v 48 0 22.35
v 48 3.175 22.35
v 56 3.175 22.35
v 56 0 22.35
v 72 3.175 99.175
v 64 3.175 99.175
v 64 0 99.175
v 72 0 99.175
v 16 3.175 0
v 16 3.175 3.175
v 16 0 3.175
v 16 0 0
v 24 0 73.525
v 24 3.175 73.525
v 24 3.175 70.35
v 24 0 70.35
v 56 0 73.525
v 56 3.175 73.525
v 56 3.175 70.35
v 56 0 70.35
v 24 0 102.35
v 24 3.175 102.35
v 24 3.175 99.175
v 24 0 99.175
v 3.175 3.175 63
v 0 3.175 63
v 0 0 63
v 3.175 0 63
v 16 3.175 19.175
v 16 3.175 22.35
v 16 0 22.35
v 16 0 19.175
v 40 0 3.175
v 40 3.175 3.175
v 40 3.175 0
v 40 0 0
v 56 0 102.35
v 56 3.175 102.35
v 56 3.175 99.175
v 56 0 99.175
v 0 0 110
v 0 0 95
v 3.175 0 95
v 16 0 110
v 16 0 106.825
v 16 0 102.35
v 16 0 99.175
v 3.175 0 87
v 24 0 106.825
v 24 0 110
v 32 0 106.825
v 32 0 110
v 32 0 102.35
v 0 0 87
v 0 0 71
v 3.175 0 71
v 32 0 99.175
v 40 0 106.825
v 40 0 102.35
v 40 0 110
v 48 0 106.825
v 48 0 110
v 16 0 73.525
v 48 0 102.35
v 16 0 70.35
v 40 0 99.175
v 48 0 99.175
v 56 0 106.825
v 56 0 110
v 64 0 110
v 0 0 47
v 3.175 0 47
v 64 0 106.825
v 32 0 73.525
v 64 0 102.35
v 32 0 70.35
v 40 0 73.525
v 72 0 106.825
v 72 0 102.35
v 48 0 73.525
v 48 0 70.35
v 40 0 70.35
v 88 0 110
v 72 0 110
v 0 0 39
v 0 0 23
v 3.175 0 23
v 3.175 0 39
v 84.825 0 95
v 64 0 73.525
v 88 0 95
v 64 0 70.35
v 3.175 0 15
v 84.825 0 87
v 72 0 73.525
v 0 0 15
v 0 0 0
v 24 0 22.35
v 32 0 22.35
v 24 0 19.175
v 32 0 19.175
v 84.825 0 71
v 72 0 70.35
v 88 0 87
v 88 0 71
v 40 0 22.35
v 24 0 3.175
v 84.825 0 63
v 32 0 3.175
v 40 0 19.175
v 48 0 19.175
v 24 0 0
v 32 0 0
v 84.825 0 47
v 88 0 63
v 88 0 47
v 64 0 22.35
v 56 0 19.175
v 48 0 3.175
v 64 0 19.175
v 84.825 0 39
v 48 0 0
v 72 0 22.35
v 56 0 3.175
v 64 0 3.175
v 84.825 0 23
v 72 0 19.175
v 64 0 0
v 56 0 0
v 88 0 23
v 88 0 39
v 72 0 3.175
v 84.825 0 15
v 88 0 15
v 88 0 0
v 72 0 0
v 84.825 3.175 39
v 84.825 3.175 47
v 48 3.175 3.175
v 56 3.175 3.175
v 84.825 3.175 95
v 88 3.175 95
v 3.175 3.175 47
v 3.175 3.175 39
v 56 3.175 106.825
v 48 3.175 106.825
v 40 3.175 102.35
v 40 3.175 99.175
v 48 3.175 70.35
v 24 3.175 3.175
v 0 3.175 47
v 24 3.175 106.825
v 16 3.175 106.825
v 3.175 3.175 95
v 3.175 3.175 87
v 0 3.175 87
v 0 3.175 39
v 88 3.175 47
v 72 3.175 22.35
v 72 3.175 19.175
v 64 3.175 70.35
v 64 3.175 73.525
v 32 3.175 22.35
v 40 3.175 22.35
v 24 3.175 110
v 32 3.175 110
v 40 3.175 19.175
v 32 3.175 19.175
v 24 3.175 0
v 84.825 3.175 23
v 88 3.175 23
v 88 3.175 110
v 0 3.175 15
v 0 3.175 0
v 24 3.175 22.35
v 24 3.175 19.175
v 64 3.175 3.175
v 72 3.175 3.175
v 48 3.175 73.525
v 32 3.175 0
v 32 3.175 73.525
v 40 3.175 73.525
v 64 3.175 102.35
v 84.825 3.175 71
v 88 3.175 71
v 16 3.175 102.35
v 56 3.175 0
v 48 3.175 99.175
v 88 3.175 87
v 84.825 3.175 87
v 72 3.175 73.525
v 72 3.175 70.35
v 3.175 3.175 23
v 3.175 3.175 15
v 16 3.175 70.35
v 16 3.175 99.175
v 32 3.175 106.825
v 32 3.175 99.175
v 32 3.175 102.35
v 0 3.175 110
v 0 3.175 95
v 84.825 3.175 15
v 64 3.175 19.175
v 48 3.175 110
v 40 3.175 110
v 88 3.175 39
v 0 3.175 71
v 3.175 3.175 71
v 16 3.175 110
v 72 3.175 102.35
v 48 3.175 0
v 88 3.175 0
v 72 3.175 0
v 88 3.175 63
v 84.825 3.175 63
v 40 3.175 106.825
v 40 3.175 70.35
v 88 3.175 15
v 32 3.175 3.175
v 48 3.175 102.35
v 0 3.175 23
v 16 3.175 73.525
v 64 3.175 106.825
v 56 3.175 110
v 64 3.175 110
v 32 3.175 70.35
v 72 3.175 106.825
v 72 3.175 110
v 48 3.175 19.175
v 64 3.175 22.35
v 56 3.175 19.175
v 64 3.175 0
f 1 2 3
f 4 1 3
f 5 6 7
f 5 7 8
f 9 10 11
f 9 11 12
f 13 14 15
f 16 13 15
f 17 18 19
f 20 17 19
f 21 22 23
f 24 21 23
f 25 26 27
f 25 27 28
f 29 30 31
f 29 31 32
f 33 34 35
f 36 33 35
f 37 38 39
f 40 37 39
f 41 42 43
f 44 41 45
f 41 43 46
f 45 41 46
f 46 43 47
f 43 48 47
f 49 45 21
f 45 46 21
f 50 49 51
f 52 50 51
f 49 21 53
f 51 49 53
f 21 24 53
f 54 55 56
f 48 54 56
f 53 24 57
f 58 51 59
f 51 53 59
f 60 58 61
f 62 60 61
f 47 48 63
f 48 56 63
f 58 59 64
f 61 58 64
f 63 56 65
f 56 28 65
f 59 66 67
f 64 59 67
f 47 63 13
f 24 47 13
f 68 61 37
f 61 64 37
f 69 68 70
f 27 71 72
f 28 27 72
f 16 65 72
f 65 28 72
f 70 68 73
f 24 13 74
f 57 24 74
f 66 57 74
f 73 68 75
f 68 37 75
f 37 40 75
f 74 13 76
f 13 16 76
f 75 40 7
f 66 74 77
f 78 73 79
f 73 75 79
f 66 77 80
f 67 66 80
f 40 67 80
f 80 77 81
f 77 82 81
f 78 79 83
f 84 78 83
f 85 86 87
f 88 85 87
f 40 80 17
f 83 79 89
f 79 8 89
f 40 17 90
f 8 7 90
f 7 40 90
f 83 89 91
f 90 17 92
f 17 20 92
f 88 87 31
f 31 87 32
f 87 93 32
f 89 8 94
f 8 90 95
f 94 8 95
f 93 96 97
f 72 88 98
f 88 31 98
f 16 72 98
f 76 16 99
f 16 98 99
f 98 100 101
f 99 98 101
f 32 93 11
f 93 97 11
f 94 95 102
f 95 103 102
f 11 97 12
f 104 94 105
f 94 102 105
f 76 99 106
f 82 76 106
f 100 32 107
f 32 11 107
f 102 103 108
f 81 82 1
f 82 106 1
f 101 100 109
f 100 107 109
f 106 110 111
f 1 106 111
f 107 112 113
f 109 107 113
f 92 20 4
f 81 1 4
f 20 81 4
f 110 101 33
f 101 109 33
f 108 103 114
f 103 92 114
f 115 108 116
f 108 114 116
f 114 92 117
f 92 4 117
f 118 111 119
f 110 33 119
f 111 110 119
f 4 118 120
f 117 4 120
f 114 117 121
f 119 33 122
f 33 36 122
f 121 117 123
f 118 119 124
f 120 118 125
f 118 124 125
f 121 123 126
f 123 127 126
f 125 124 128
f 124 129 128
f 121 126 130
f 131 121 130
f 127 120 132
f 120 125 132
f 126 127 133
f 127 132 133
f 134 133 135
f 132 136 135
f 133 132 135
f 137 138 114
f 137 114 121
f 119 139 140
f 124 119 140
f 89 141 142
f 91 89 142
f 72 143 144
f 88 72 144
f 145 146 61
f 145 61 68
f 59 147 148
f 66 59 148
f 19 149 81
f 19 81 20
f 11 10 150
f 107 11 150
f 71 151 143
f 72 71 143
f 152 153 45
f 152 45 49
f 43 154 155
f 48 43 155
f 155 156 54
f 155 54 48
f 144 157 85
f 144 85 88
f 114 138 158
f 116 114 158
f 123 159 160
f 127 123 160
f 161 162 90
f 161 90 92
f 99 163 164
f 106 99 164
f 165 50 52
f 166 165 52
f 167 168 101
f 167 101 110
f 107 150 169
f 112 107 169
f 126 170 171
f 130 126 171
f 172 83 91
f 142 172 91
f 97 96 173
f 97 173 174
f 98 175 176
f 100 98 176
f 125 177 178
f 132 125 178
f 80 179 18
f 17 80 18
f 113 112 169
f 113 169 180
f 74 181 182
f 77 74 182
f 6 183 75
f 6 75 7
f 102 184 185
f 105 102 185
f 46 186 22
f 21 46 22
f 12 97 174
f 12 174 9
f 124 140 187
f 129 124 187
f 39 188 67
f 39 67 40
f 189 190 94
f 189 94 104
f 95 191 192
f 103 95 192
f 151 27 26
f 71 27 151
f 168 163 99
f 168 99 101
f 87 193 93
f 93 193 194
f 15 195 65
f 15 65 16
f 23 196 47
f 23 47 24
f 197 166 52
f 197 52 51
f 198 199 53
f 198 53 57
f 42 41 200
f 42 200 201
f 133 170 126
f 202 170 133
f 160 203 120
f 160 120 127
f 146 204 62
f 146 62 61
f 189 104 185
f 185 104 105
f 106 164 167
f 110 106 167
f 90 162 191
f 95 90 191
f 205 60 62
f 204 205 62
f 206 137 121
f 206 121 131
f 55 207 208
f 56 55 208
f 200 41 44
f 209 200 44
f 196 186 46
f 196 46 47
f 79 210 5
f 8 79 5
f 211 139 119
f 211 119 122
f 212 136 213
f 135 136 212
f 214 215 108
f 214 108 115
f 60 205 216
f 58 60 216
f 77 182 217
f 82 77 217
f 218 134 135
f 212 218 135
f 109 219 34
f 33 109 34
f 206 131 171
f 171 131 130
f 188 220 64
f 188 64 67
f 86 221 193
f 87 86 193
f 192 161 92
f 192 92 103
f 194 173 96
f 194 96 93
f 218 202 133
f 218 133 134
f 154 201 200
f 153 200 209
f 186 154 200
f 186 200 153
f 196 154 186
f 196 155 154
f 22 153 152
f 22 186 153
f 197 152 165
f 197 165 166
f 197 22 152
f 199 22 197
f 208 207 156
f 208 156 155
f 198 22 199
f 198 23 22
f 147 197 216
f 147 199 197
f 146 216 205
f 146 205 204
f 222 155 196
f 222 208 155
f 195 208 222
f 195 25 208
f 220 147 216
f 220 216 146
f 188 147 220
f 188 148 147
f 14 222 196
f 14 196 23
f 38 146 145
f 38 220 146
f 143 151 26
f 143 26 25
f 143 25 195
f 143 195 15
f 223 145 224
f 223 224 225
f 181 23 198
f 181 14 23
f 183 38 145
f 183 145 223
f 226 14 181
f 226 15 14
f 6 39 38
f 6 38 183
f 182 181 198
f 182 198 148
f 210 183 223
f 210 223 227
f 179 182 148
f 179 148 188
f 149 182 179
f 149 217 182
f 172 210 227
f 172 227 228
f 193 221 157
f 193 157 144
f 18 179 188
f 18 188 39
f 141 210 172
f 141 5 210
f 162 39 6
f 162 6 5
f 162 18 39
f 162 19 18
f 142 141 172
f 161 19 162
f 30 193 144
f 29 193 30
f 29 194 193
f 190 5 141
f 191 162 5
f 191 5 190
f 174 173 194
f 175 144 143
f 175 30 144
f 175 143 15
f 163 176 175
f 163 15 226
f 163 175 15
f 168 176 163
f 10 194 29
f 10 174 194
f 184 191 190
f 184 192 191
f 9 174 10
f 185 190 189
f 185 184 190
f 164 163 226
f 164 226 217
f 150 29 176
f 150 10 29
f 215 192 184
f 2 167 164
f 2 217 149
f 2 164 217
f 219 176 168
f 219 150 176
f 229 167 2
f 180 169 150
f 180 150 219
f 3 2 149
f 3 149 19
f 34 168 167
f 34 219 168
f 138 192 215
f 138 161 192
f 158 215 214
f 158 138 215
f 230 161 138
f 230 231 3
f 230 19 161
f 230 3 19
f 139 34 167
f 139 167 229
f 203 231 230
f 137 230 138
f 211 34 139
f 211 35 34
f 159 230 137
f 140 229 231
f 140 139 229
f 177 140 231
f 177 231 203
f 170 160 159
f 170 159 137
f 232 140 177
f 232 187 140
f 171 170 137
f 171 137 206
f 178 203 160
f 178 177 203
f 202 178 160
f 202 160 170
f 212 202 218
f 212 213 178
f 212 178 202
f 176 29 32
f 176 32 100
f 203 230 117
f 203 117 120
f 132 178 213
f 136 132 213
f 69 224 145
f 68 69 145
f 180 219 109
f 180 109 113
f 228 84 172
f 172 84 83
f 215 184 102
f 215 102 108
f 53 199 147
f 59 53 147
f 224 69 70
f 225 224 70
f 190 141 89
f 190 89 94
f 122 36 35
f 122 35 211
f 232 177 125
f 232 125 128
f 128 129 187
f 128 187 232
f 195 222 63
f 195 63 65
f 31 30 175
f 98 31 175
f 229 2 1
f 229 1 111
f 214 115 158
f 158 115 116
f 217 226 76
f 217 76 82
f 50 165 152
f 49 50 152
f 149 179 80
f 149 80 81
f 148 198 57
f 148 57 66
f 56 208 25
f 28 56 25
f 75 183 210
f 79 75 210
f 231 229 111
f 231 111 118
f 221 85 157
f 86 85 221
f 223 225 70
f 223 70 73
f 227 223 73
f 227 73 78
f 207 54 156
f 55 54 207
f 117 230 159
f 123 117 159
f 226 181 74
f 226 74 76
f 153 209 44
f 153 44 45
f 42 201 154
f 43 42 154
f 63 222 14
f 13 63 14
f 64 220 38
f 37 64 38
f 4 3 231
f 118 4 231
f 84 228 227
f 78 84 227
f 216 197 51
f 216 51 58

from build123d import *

# Parameters (mm, degrees)
SKETCH1_W           = 88
SKETCH1_H           = 110
BOSS_EXTRUDE1_DEPTH = 3.175
CUT_EXTRUDE1_REACH  = 5.175
SKETCH2_W           = 8
SKETCH2_H           = 3.175
SKETCH2_W_2         = 3.175
SKETCH2_H_2         = 8
CUT_EXTRUDE2_REACH  = 5.175
SKETCH3_W           = 8
SKETCH3_H           = 3.175
CUT_EXTRUDE3_REACH  = 5.175
SKETCH4_W           = 8
SKETCH4_H           = 3.175


with BuildPart() as part:
    # Sketch1 → Boss-Extrude1 (new body)
    with BuildSketch(Plane(origin=(0, 0, 0), x_dir=(1, 0, 0), z_dir=(0, 1, 0))):
        with Locations((44, -55)):
            Rectangle(SKETCH1_W, SKETCH1_H)
    extrude(amount=BOSS_EXTRUDE1_DEPTH)

    # Sketch2 → Cut-Extrude1 (cut, up to next)
    with BuildSketch(Plane(origin=(0, 3.175, 0), x_dir=(1, 0, 0), z_dir=(0, 1, 0)), mode=Mode.PRIVATE) as cut_extrude1_sk1:
        with Locations((68, -1.5875)):
            Rectangle(SKETCH2_W, SKETCH2_H)
    cut_extrude1_tool1 = extrude(cut_extrude1_sk1.sketch, amount=-CUT_EXTRUDE1_REACH, mode=Mode.PRIVATE) & part.part
    add(cut_extrude1_tool1.solids().sort_by_distance((68, 3.175, 1.5875))[0], mode=Mode.SUBTRACT)
    # Sketch2 → Cut-Extrude1 (cut, up to next)
    with BuildSketch(Plane(origin=(0, 3.175, 0), x_dir=(1, 0, 0), z_dir=(0, 1, 0)), mode=Mode.PRIVATE) as cut_extrude1_sk2:
        with Locations((52, -1.5875)):
            Rectangle(SKETCH2_W, SKETCH2_H)
    cut_extrude1_tool2 = extrude(cut_extrude1_sk2.sketch, amount=-CUT_EXTRUDE1_REACH, mode=Mode.PRIVATE) & part.part
    add(cut_extrude1_tool2.solids().sort_by_distance((52, 3.175, 1.5875))[0], mode=Mode.SUBTRACT)
    # Sketch2 → Cut-Extrude1 (cut, up to next)
    with BuildSketch(Plane(origin=(0, 3.175, 0), x_dir=(1, 0, 0), z_dir=(0, 1, 0)), mode=Mode.PRIVATE) as cut_extrude1_sk3:
        with Locations((20, -1.5875)):
            Rectangle(SKETCH2_W, SKETCH2_H)
    cut_extrude1_tool3 = extrude(cut_extrude1_sk3.sketch, amount=-CUT_EXTRUDE1_REACH, mode=Mode.PRIVATE) & part.part
    add(cut_extrude1_tool3.solids().sort_by_distance((20, 3.175, 1.5875))[0], mode=Mode.SUBTRACT)
    # Sketch2 → Cut-Extrude1 (cut, up to next)
    with BuildSketch(Plane(origin=(0, 3.175, 0), x_dir=(1, 0, 0), z_dir=(0, 1, 0)), mode=Mode.PRIVATE) as cut_extrude1_sk4:
        with Locations((36, -1.5875)):
            Rectangle(SKETCH2_W, SKETCH2_H)
    cut_extrude1_tool4 = extrude(cut_extrude1_sk4.sketch, amount=-CUT_EXTRUDE1_REACH, mode=Mode.PRIVATE) & part.part
    add(cut_extrude1_tool4.solids().sort_by_distance((36, 3.175, 1.5875))[0], mode=Mode.SUBTRACT)
    # Sketch2 → Cut-Extrude1 (cut, up to next)
    with BuildSketch(Plane(origin=(0, 3.175, 0), x_dir=(1, 0, 0), z_dir=(0, 1, 0)), mode=Mode.PRIVATE) as cut_extrude1_sk5:
        with Locations((1.5875, -19)):
            Rectangle(SKETCH2_W_2, SKETCH2_H_2)
    cut_extrude1_tool5 = extrude(cut_extrude1_sk5.sketch, amount=-CUT_EXTRUDE1_REACH, mode=Mode.PRIVATE) & part.part
    add(cut_extrude1_tool5.solids().sort_by_distance((1.5875, 3.175, 19))[0], mode=Mode.SUBTRACT)
    # Sketch2 → Cut-Extrude1 (cut, up to next)
    with BuildSketch(Plane(origin=(0, 3.175, 0), x_dir=(1, 0, 0), z_dir=(0, 1, 0)), mode=Mode.PRIVATE) as cut_extrude1_sk6:
        with Locations((1.5875, -43)):
            Rectangle(SKETCH2_W_2, SKETCH2_H_2)
    cut_extrude1_tool6 = extrude(cut_extrude1_sk6.sketch, amount=-CUT_EXTRUDE1_REACH, mode=Mode.PRIVATE) & part.part
    add(cut_extrude1_tool6.solids().sort_by_distance((1.5875, 3.175, 43))[0], mode=Mode.SUBTRACT)
    # Sketch2 → Cut-Extrude1 (cut, up to next)
    with BuildSketch(Plane(origin=(0, 3.175, 0), x_dir=(1, 0, 0), z_dir=(0, 1, 0)), mode=Mode.PRIVATE) as cut_extrude1_sk7:
        with Locations((1.5875, -91)):
            Rectangle(SKETCH2_W_2, SKETCH2_H_2)
    cut_extrude1_tool7 = extrude(cut_extrude1_sk7.sketch, amount=-CUT_EXTRUDE1_REACH, mode=Mode.PRIVATE) & part.part
    add(cut_extrude1_tool7.solids().sort_by_distance((1.5875, 3.175, 91))[0], mode=Mode.SUBTRACT)
    # Sketch2 → Cut-Extrude1 (cut, up to next)
    with BuildSketch(Plane(origin=(0, 3.175, 0), x_dir=(1, 0, 0), z_dir=(0, 1, 0)), mode=Mode.PRIVATE) as cut_extrude1_sk8:
        with Locations((1.5875, -67)):
            Rectangle(SKETCH2_W_2, SKETCH2_H_2)
    cut_extrude1_tool8 = extrude(cut_extrude1_sk8.sketch, amount=-CUT_EXTRUDE1_REACH, mode=Mode.PRIVATE) & part.part
    add(cut_extrude1_tool8.solids().sort_by_distance((1.5875, 3.175, 67))[0], mode=Mode.SUBTRACT)
    # Sketch2 → Cut-Extrude1 (cut, up to next)
    with BuildSketch(Plane(origin=(0, 3.175, 0), x_dir=(1, 0, 0), z_dir=(0, 1, 0)), mode=Mode.PRIVATE) as cut_extrude1_sk9:
        with Locations((20, -108.4125)):
            Rectangle(SKETCH2_W, SKETCH2_H)
    cut_extrude1_tool9 = extrude(cut_extrude1_sk9.sketch, amount=-CUT_EXTRUDE1_REACH, mode=Mode.PRIVATE) & part.part
    add(cut_extrude1_tool9.solids().sort_by_distance((20, 3.175, 108.4125))[0], mode=Mode.SUBTRACT)
    # Sketch2 → Cut-Extrude1 (cut, up to next)
    with BuildSketch(Plane(origin=(0, 3.175, 0), x_dir=(1, 0, 0), z_dir=(0, 1, 0)), mode=Mode.PRIVATE) as cut_extrude1_sk10:
        with Locations((36, -108.4125)):
            Rectangle(SKETCH2_W, SKETCH2_H)
    cut_extrude1_tool10 = extrude(cut_extrude1_sk10.sketch, amount=-CUT_EXTRUDE1_REACH, mode=Mode.PRIVATE) & part.part
    add(cut_extrude1_tool10.solids().sort_by_distance((36, 3.175, 108.4125))[0], mode=Mode.SUBTRACT)
    # Sketch2 → Cut-Extrude1 (cut, up to next)
    with BuildSketch(Plane(origin=(0, 3.175, 0), x_dir=(1, 0, 0), z_dir=(0, 1, 0)), mode=Mode.PRIVATE) as cut_extrude1_sk11:
        with Locations((68, -108.4125)):
            Rectangle(SKETCH2_W, SKETCH2_H)
    cut_extrude1_tool11 = extrude(cut_extrude1_sk11.sketch, amount=-CUT_EXTRUDE1_REACH, mode=Mode.PRIVATE) & part.part
    add(cut_extrude1_tool11.solids().sort_by_distance((68, 3.175, 108.4125))[0], mode=Mode.SUBTRACT)
    # Sketch2 → Cut-Extrude1 (cut, up to next)
    with BuildSketch(Plane(origin=(0, 3.175, 0), x_dir=(1, 0, 0), z_dir=(0, 1, 0)), mode=Mode.PRIVATE) as cut_extrude1_sk12:
        with Locations((52, -108.4125)):
            Rectangle(SKETCH2_W, SKETCH2_H)
    cut_extrude1_tool12 = extrude(cut_extrude1_sk12.sketch, amount=-CUT_EXTRUDE1_REACH, mode=Mode.PRIVATE) & part.part
    add(cut_extrude1_tool12.solids().sort_by_distance((52, 3.175, 108.4125))[0], mode=Mode.SUBTRACT)
    # Sketch2 → Cut-Extrude1 (cut, up to next)
    with BuildSketch(Plane(origin=(0, 3.175, 0), x_dir=(1, 0, 0), z_dir=(0, 1, 0)), mode=Mode.PRIVATE) as cut_extrude1_sk13:
        with Locations((86.4125, -91)):
            Rectangle(SKETCH2_W_2, SKETCH2_H_2)
    cut_extrude1_tool13 = extrude(cut_extrude1_sk13.sketch, amount=-CUT_EXTRUDE1_REACH, mode=Mode.PRIVATE) & part.part
    add(cut_extrude1_tool13.solids().sort_by_distance((86.4125, 3.175, 91))[0], mode=Mode.SUBTRACT)
    # Sketch2 → Cut-Extrude1 (cut, up to next)
    with BuildSketch(Plane(origin=(0, 3.175, 0), x_dir=(1, 0, 0), z_dir=(0, 1, 0)), mode=Mode.PRIVATE) as cut_extrude1_sk14:
        with Locations((86.4125, -67)):
            Rectangle(SKETCH2_W_2, SKETCH2_H_2)
    cut_extrude1_tool14 = extrude(cut_extrude1_sk14.sketch, amount=-CUT_EXTRUDE1_REACH, mode=Mode.PRIVATE) & part.part
    add(cut_extrude1_tool14.solids().sort_by_distance((86.4125, 3.175, 67))[0], mode=Mode.SUBTRACT)
    # Sketch2 → Cut-Extrude1 (cut, up to next)
    with BuildSketch(Plane(origin=(0, 3.175, 0), x_dir=(1, 0, 0), z_dir=(0, 1, 0)), mode=Mode.PRIVATE) as cut_extrude1_sk15:
        with Locations((86.4125, -19)):
            Rectangle(SKETCH2_W_2, SKETCH2_H_2)
    cut_extrude1_tool15 = extrude(cut_extrude1_sk15.sketch, amount=-CUT_EXTRUDE1_REACH, mode=Mode.PRIVATE) & part.part
    add(cut_extrude1_tool15.solids().sort_by_distance((86.4125, 3.175, 19))[0], mode=Mode.SUBTRACT)
    # Sketch2 → Cut-Extrude1 (cut, up to next)
    with BuildSketch(Plane(origin=(0, 3.175, 0), x_dir=(1, 0, 0), z_dir=(0, 1, 0)), mode=Mode.PRIVATE) as cut_extrude1_sk16:
        with Locations((86.4125, -43)):
            Rectangle(SKETCH2_W_2, SKETCH2_H_2)
    cut_extrude1_tool16 = extrude(cut_extrude1_sk16.sketch, amount=-CUT_EXTRUDE1_REACH, mode=Mode.PRIVATE) & part.part
    add(cut_extrude1_tool16.solids().sort_by_distance((86.4125, 3.175, 43))[0], mode=Mode.SUBTRACT)

    # Sketch3 → Cut-Extrude2 (cut, up to next)
    with BuildSketch(Plane(origin=(0, 3.175, 0), x_dir=(1, 0, 0), z_dir=(0, 1, 0)), mode=Mode.PRIVATE) as cut_extrude2_sk1:
        with Locations((68, -20.7625)):
            Rectangle(SKETCH3_W, SKETCH3_H)
    cut_extrude2_tool1 = extrude(cut_extrude2_sk1.sketch, amount=-CUT_EXTRUDE2_REACH, mode=Mode.PRIVATE) & part.part
    add(cut_extrude2_tool1.solids().sort_by_distance((68, 3.175, 20.7625))[0], mode=Mode.SUBTRACT)
    # Sketch3 → Cut-Extrude2 (cut, up to next)
    with BuildSketch(Plane(origin=(0, 3.175, 0), x_dir=(1, 0, 0), z_dir=(0, 1, 0)), mode=Mode.PRIVATE) as cut_extrude2_sk2:
        with Locations((52, -20.7625)):
            Rectangle(SKETCH3_W, SKETCH3_H)
    cut_extrude2_tool2 = extrude(cut_extrude2_sk2.sketch, amount=-CUT_EXTRUDE2_REACH, mode=Mode.PRIVATE) & part.part
    add(cut_extrude2_tool2.solids().sort_by_distance((52, 3.175, 20.7625))[0], mode=Mode.SUBTRACT)
    # Sketch3 → Cut-Extrude2 (cut, up to next)
    with BuildSketch(Plane(origin=(0, 3.175, 0), x_dir=(1, 0, 0), z_dir=(0, 1, 0)), mode=Mode.PRIVATE) as cut_extrude2_sk3:
        with Locations((20, -20.7625)):
            Rectangle(SKETCH3_W, SKETCH3_H)
    cut_extrude2_tool3 = extrude(cut_extrude2_sk3.sketch, amount=-CUT_EXTRUDE2_REACH, mode=Mode.PRIVATE) & part.part
    add(cut_extrude2_tool3.solids().sort_by_distance((20, 3.175, 20.7625))[0], mode=Mode.SUBTRACT)
    # Sketch3 → Cut-Extrude2 (cut, up to next)
    with BuildSketch(Plane(origin=(0, 3.175, 0), x_dir=(1, 0, 0), z_dir=(0, 1, 0)), mode=Mode.PRIVATE) as cut_extrude2_sk4:
        with Locations((36, -20.7625)):
            Rectangle(SKETCH3_W, SKETCH3_H)
    cut_extrude2_tool4 = extrude(cut_extrude2_sk4.sketch, amount=-CUT_EXTRUDE2_REACH, mode=Mode.PRIVATE) & part.part
    add(cut_extrude2_tool4.solids().sort_by_distance((36, 3.175, 20.7625))[0], mode=Mode.SUBTRACT)

    # Sketch4 → Cut-Extrude3 (cut, up to next)
    with BuildSketch(Plane(origin=(0, 3.175, 0), x_dir=(1, 0, 0), z_dir=(0, 1, 0)), mode=Mode.PRIVATE) as cut_extrude3_sk1:
        with Locations((68, -71.9375)):
            Rectangle(SKETCH4_W, SKETCH4_H)
    cut_extrude3_tool1 = extrude(cut_extrude3_sk1.sketch, amount=-CUT_EXTRUDE3_REACH, mode=Mode.PRIVATE) & part.part
    add(cut_extrude3_tool1.solids().sort_by_distance((68, 3.175, 71.9375))[0], mode=Mode.SUBTRACT)
    # Sketch4 → Cut-Extrude3 (cut, up to next)
    with BuildSketch(Plane(origin=(0, 3.175, 0), x_dir=(1, 0, 0), z_dir=(0, 1, 0)), mode=Mode.PRIVATE) as cut_extrude3_sk2:
        with Locations((52, -71.9375)):
            Rectangle(SKETCH4_W, SKETCH4_H)
    cut_extrude3_tool2 = extrude(cut_extrude3_sk2.sketch, amount=-CUT_EXTRUDE3_REACH, mode=Mode.PRIVATE) & part.part
    add(cut_extrude3_tool2.solids().sort_by_distance((52, 3.175, 71.9375))[0], mode=Mode.SUBTRACT)
    # Sketch4 → Cut-Extrude3 (cut, up to next)
    with BuildSketch(Plane(origin=(0, 3.175, 0), x_dir=(1, 0, 0), z_dir=(0, 1, 0)), mode=Mode.PRIVATE) as cut_extrude3_sk3:
        with Locations((20, -71.9375)):
            Rectangle(SKETCH4_W, SKETCH4_H)
    cut_extrude3_tool3 = extrude(cut_extrude3_sk3.sketch, amount=-CUT_EXTRUDE3_REACH, mode=Mode.PRIVATE) & part.part
    add(cut_extrude3_tool3.solids().sort_by_distance((20, 3.175, 71.9375))[0], mode=Mode.SUBTRACT)
    # Sketch4 → Cut-Extrude3 (cut, up to next)
    with BuildSketch(Plane(origin=(0, 3.175, 0), x_dir=(1, 0, 0), z_dir=(0, 1, 0)), mode=Mode.PRIVATE) as cut_extrude3_sk4:
        with Locations((36, -71.9375)):
            Rectangle(SKETCH4_W, SKETCH4_H)
    cut_extrude3_tool4 = extrude(cut_extrude3_sk4.sketch, amount=-CUT_EXTRUDE3_REACH, mode=Mode.PRIVATE) & part.part
    add(cut_extrude3_tool4.solids().sort_by_distance((36, 3.175, 71.9375))[0], mode=Mode.SUBTRACT)
    # Sketch4 → Cut-Extrude3 (cut, up to next)
    with BuildSketch(Plane(origin=(0, 3.175, 0), x_dir=(1, 0, 0), z_dir=(0, 1, 0)), mode=Mode.PRIVATE) as cut_extrude3_sk5:
        with Locations((68, -100.7625)):
            Rectangle(SKETCH4_W, SKETCH4_H)
    cut_extrude3_tool5 = extrude(cut_extrude3_sk5.sketch, amount=-CUT_EXTRUDE3_REACH, mode=Mode.PRIVATE) & part.part
    add(cut_extrude3_tool5.solids().sort_by_distance((68, 3.175, 100.7625))[0], mode=Mode.SUBTRACT)
    # Sketch4 → Cut-Extrude3 (cut, up to next)
    with BuildSketch(Plane(origin=(0, 3.175, 0), x_dir=(1, 0, 0), z_dir=(0, 1, 0)), mode=Mode.PRIVATE) as cut_extrude3_sk6:
        with Locations((52, -100.7625)):
            Rectangle(SKETCH4_W, SKETCH4_H)
    cut_extrude3_tool6 = extrude(cut_extrude3_sk6.sketch, amount=-CUT_EXTRUDE3_REACH, mode=Mode.PRIVATE) & part.part
    add(cut_extrude3_tool6.solids().sort_by_distance((52, 3.175, 100.7625))[0], mode=Mode.SUBTRACT)
    # Sketch4 → Cut-Extrude3 (cut, up to next)
    with BuildSketch(Plane(origin=(0, 3.175, 0), x_dir=(1, 0, 0), z_dir=(0, 1, 0)), mode=Mode.PRIVATE) as cut_extrude3_sk7:
        with Locations((20, -100.7625)):
            Rectangle(SKETCH4_W, SKETCH4_H)
    cut_extrude3_tool7 = extrude(cut_extrude3_sk7.sketch, amount=-CUT_EXTRUDE3_REACH, mode=Mode.PRIVATE) & part.part
    add(cut_extrude3_tool7.solids().sort_by_distance((20, 3.175, 100.7625))[0], mode=Mode.SUBTRACT)
    # Sketch4 → Cut-Extrude3 (cut, up to next)
    with BuildSketch(Plane(origin=(0, 3.175, 0), x_dir=(1, 0, 0), z_dir=(0, 1, 0)), mode=Mode.PRIVATE) as cut_extrude3_sk8:
        with Locations((36, -100.7625)):
            Rectangle(SKETCH4_W, SKETCH4_H)
    cut_extrude3_tool8 = extrude(cut_extrude3_sk8.sketch, amount=-CUT_EXTRUDE3_REACH, mode=Mode.PRIVATE) & part.part
    add(cut_extrude3_tool8.solids().sort_by_distance((36, 3.175, 100.7625))[0], mode=Mode.SUBTRACT)


solid = part.part
